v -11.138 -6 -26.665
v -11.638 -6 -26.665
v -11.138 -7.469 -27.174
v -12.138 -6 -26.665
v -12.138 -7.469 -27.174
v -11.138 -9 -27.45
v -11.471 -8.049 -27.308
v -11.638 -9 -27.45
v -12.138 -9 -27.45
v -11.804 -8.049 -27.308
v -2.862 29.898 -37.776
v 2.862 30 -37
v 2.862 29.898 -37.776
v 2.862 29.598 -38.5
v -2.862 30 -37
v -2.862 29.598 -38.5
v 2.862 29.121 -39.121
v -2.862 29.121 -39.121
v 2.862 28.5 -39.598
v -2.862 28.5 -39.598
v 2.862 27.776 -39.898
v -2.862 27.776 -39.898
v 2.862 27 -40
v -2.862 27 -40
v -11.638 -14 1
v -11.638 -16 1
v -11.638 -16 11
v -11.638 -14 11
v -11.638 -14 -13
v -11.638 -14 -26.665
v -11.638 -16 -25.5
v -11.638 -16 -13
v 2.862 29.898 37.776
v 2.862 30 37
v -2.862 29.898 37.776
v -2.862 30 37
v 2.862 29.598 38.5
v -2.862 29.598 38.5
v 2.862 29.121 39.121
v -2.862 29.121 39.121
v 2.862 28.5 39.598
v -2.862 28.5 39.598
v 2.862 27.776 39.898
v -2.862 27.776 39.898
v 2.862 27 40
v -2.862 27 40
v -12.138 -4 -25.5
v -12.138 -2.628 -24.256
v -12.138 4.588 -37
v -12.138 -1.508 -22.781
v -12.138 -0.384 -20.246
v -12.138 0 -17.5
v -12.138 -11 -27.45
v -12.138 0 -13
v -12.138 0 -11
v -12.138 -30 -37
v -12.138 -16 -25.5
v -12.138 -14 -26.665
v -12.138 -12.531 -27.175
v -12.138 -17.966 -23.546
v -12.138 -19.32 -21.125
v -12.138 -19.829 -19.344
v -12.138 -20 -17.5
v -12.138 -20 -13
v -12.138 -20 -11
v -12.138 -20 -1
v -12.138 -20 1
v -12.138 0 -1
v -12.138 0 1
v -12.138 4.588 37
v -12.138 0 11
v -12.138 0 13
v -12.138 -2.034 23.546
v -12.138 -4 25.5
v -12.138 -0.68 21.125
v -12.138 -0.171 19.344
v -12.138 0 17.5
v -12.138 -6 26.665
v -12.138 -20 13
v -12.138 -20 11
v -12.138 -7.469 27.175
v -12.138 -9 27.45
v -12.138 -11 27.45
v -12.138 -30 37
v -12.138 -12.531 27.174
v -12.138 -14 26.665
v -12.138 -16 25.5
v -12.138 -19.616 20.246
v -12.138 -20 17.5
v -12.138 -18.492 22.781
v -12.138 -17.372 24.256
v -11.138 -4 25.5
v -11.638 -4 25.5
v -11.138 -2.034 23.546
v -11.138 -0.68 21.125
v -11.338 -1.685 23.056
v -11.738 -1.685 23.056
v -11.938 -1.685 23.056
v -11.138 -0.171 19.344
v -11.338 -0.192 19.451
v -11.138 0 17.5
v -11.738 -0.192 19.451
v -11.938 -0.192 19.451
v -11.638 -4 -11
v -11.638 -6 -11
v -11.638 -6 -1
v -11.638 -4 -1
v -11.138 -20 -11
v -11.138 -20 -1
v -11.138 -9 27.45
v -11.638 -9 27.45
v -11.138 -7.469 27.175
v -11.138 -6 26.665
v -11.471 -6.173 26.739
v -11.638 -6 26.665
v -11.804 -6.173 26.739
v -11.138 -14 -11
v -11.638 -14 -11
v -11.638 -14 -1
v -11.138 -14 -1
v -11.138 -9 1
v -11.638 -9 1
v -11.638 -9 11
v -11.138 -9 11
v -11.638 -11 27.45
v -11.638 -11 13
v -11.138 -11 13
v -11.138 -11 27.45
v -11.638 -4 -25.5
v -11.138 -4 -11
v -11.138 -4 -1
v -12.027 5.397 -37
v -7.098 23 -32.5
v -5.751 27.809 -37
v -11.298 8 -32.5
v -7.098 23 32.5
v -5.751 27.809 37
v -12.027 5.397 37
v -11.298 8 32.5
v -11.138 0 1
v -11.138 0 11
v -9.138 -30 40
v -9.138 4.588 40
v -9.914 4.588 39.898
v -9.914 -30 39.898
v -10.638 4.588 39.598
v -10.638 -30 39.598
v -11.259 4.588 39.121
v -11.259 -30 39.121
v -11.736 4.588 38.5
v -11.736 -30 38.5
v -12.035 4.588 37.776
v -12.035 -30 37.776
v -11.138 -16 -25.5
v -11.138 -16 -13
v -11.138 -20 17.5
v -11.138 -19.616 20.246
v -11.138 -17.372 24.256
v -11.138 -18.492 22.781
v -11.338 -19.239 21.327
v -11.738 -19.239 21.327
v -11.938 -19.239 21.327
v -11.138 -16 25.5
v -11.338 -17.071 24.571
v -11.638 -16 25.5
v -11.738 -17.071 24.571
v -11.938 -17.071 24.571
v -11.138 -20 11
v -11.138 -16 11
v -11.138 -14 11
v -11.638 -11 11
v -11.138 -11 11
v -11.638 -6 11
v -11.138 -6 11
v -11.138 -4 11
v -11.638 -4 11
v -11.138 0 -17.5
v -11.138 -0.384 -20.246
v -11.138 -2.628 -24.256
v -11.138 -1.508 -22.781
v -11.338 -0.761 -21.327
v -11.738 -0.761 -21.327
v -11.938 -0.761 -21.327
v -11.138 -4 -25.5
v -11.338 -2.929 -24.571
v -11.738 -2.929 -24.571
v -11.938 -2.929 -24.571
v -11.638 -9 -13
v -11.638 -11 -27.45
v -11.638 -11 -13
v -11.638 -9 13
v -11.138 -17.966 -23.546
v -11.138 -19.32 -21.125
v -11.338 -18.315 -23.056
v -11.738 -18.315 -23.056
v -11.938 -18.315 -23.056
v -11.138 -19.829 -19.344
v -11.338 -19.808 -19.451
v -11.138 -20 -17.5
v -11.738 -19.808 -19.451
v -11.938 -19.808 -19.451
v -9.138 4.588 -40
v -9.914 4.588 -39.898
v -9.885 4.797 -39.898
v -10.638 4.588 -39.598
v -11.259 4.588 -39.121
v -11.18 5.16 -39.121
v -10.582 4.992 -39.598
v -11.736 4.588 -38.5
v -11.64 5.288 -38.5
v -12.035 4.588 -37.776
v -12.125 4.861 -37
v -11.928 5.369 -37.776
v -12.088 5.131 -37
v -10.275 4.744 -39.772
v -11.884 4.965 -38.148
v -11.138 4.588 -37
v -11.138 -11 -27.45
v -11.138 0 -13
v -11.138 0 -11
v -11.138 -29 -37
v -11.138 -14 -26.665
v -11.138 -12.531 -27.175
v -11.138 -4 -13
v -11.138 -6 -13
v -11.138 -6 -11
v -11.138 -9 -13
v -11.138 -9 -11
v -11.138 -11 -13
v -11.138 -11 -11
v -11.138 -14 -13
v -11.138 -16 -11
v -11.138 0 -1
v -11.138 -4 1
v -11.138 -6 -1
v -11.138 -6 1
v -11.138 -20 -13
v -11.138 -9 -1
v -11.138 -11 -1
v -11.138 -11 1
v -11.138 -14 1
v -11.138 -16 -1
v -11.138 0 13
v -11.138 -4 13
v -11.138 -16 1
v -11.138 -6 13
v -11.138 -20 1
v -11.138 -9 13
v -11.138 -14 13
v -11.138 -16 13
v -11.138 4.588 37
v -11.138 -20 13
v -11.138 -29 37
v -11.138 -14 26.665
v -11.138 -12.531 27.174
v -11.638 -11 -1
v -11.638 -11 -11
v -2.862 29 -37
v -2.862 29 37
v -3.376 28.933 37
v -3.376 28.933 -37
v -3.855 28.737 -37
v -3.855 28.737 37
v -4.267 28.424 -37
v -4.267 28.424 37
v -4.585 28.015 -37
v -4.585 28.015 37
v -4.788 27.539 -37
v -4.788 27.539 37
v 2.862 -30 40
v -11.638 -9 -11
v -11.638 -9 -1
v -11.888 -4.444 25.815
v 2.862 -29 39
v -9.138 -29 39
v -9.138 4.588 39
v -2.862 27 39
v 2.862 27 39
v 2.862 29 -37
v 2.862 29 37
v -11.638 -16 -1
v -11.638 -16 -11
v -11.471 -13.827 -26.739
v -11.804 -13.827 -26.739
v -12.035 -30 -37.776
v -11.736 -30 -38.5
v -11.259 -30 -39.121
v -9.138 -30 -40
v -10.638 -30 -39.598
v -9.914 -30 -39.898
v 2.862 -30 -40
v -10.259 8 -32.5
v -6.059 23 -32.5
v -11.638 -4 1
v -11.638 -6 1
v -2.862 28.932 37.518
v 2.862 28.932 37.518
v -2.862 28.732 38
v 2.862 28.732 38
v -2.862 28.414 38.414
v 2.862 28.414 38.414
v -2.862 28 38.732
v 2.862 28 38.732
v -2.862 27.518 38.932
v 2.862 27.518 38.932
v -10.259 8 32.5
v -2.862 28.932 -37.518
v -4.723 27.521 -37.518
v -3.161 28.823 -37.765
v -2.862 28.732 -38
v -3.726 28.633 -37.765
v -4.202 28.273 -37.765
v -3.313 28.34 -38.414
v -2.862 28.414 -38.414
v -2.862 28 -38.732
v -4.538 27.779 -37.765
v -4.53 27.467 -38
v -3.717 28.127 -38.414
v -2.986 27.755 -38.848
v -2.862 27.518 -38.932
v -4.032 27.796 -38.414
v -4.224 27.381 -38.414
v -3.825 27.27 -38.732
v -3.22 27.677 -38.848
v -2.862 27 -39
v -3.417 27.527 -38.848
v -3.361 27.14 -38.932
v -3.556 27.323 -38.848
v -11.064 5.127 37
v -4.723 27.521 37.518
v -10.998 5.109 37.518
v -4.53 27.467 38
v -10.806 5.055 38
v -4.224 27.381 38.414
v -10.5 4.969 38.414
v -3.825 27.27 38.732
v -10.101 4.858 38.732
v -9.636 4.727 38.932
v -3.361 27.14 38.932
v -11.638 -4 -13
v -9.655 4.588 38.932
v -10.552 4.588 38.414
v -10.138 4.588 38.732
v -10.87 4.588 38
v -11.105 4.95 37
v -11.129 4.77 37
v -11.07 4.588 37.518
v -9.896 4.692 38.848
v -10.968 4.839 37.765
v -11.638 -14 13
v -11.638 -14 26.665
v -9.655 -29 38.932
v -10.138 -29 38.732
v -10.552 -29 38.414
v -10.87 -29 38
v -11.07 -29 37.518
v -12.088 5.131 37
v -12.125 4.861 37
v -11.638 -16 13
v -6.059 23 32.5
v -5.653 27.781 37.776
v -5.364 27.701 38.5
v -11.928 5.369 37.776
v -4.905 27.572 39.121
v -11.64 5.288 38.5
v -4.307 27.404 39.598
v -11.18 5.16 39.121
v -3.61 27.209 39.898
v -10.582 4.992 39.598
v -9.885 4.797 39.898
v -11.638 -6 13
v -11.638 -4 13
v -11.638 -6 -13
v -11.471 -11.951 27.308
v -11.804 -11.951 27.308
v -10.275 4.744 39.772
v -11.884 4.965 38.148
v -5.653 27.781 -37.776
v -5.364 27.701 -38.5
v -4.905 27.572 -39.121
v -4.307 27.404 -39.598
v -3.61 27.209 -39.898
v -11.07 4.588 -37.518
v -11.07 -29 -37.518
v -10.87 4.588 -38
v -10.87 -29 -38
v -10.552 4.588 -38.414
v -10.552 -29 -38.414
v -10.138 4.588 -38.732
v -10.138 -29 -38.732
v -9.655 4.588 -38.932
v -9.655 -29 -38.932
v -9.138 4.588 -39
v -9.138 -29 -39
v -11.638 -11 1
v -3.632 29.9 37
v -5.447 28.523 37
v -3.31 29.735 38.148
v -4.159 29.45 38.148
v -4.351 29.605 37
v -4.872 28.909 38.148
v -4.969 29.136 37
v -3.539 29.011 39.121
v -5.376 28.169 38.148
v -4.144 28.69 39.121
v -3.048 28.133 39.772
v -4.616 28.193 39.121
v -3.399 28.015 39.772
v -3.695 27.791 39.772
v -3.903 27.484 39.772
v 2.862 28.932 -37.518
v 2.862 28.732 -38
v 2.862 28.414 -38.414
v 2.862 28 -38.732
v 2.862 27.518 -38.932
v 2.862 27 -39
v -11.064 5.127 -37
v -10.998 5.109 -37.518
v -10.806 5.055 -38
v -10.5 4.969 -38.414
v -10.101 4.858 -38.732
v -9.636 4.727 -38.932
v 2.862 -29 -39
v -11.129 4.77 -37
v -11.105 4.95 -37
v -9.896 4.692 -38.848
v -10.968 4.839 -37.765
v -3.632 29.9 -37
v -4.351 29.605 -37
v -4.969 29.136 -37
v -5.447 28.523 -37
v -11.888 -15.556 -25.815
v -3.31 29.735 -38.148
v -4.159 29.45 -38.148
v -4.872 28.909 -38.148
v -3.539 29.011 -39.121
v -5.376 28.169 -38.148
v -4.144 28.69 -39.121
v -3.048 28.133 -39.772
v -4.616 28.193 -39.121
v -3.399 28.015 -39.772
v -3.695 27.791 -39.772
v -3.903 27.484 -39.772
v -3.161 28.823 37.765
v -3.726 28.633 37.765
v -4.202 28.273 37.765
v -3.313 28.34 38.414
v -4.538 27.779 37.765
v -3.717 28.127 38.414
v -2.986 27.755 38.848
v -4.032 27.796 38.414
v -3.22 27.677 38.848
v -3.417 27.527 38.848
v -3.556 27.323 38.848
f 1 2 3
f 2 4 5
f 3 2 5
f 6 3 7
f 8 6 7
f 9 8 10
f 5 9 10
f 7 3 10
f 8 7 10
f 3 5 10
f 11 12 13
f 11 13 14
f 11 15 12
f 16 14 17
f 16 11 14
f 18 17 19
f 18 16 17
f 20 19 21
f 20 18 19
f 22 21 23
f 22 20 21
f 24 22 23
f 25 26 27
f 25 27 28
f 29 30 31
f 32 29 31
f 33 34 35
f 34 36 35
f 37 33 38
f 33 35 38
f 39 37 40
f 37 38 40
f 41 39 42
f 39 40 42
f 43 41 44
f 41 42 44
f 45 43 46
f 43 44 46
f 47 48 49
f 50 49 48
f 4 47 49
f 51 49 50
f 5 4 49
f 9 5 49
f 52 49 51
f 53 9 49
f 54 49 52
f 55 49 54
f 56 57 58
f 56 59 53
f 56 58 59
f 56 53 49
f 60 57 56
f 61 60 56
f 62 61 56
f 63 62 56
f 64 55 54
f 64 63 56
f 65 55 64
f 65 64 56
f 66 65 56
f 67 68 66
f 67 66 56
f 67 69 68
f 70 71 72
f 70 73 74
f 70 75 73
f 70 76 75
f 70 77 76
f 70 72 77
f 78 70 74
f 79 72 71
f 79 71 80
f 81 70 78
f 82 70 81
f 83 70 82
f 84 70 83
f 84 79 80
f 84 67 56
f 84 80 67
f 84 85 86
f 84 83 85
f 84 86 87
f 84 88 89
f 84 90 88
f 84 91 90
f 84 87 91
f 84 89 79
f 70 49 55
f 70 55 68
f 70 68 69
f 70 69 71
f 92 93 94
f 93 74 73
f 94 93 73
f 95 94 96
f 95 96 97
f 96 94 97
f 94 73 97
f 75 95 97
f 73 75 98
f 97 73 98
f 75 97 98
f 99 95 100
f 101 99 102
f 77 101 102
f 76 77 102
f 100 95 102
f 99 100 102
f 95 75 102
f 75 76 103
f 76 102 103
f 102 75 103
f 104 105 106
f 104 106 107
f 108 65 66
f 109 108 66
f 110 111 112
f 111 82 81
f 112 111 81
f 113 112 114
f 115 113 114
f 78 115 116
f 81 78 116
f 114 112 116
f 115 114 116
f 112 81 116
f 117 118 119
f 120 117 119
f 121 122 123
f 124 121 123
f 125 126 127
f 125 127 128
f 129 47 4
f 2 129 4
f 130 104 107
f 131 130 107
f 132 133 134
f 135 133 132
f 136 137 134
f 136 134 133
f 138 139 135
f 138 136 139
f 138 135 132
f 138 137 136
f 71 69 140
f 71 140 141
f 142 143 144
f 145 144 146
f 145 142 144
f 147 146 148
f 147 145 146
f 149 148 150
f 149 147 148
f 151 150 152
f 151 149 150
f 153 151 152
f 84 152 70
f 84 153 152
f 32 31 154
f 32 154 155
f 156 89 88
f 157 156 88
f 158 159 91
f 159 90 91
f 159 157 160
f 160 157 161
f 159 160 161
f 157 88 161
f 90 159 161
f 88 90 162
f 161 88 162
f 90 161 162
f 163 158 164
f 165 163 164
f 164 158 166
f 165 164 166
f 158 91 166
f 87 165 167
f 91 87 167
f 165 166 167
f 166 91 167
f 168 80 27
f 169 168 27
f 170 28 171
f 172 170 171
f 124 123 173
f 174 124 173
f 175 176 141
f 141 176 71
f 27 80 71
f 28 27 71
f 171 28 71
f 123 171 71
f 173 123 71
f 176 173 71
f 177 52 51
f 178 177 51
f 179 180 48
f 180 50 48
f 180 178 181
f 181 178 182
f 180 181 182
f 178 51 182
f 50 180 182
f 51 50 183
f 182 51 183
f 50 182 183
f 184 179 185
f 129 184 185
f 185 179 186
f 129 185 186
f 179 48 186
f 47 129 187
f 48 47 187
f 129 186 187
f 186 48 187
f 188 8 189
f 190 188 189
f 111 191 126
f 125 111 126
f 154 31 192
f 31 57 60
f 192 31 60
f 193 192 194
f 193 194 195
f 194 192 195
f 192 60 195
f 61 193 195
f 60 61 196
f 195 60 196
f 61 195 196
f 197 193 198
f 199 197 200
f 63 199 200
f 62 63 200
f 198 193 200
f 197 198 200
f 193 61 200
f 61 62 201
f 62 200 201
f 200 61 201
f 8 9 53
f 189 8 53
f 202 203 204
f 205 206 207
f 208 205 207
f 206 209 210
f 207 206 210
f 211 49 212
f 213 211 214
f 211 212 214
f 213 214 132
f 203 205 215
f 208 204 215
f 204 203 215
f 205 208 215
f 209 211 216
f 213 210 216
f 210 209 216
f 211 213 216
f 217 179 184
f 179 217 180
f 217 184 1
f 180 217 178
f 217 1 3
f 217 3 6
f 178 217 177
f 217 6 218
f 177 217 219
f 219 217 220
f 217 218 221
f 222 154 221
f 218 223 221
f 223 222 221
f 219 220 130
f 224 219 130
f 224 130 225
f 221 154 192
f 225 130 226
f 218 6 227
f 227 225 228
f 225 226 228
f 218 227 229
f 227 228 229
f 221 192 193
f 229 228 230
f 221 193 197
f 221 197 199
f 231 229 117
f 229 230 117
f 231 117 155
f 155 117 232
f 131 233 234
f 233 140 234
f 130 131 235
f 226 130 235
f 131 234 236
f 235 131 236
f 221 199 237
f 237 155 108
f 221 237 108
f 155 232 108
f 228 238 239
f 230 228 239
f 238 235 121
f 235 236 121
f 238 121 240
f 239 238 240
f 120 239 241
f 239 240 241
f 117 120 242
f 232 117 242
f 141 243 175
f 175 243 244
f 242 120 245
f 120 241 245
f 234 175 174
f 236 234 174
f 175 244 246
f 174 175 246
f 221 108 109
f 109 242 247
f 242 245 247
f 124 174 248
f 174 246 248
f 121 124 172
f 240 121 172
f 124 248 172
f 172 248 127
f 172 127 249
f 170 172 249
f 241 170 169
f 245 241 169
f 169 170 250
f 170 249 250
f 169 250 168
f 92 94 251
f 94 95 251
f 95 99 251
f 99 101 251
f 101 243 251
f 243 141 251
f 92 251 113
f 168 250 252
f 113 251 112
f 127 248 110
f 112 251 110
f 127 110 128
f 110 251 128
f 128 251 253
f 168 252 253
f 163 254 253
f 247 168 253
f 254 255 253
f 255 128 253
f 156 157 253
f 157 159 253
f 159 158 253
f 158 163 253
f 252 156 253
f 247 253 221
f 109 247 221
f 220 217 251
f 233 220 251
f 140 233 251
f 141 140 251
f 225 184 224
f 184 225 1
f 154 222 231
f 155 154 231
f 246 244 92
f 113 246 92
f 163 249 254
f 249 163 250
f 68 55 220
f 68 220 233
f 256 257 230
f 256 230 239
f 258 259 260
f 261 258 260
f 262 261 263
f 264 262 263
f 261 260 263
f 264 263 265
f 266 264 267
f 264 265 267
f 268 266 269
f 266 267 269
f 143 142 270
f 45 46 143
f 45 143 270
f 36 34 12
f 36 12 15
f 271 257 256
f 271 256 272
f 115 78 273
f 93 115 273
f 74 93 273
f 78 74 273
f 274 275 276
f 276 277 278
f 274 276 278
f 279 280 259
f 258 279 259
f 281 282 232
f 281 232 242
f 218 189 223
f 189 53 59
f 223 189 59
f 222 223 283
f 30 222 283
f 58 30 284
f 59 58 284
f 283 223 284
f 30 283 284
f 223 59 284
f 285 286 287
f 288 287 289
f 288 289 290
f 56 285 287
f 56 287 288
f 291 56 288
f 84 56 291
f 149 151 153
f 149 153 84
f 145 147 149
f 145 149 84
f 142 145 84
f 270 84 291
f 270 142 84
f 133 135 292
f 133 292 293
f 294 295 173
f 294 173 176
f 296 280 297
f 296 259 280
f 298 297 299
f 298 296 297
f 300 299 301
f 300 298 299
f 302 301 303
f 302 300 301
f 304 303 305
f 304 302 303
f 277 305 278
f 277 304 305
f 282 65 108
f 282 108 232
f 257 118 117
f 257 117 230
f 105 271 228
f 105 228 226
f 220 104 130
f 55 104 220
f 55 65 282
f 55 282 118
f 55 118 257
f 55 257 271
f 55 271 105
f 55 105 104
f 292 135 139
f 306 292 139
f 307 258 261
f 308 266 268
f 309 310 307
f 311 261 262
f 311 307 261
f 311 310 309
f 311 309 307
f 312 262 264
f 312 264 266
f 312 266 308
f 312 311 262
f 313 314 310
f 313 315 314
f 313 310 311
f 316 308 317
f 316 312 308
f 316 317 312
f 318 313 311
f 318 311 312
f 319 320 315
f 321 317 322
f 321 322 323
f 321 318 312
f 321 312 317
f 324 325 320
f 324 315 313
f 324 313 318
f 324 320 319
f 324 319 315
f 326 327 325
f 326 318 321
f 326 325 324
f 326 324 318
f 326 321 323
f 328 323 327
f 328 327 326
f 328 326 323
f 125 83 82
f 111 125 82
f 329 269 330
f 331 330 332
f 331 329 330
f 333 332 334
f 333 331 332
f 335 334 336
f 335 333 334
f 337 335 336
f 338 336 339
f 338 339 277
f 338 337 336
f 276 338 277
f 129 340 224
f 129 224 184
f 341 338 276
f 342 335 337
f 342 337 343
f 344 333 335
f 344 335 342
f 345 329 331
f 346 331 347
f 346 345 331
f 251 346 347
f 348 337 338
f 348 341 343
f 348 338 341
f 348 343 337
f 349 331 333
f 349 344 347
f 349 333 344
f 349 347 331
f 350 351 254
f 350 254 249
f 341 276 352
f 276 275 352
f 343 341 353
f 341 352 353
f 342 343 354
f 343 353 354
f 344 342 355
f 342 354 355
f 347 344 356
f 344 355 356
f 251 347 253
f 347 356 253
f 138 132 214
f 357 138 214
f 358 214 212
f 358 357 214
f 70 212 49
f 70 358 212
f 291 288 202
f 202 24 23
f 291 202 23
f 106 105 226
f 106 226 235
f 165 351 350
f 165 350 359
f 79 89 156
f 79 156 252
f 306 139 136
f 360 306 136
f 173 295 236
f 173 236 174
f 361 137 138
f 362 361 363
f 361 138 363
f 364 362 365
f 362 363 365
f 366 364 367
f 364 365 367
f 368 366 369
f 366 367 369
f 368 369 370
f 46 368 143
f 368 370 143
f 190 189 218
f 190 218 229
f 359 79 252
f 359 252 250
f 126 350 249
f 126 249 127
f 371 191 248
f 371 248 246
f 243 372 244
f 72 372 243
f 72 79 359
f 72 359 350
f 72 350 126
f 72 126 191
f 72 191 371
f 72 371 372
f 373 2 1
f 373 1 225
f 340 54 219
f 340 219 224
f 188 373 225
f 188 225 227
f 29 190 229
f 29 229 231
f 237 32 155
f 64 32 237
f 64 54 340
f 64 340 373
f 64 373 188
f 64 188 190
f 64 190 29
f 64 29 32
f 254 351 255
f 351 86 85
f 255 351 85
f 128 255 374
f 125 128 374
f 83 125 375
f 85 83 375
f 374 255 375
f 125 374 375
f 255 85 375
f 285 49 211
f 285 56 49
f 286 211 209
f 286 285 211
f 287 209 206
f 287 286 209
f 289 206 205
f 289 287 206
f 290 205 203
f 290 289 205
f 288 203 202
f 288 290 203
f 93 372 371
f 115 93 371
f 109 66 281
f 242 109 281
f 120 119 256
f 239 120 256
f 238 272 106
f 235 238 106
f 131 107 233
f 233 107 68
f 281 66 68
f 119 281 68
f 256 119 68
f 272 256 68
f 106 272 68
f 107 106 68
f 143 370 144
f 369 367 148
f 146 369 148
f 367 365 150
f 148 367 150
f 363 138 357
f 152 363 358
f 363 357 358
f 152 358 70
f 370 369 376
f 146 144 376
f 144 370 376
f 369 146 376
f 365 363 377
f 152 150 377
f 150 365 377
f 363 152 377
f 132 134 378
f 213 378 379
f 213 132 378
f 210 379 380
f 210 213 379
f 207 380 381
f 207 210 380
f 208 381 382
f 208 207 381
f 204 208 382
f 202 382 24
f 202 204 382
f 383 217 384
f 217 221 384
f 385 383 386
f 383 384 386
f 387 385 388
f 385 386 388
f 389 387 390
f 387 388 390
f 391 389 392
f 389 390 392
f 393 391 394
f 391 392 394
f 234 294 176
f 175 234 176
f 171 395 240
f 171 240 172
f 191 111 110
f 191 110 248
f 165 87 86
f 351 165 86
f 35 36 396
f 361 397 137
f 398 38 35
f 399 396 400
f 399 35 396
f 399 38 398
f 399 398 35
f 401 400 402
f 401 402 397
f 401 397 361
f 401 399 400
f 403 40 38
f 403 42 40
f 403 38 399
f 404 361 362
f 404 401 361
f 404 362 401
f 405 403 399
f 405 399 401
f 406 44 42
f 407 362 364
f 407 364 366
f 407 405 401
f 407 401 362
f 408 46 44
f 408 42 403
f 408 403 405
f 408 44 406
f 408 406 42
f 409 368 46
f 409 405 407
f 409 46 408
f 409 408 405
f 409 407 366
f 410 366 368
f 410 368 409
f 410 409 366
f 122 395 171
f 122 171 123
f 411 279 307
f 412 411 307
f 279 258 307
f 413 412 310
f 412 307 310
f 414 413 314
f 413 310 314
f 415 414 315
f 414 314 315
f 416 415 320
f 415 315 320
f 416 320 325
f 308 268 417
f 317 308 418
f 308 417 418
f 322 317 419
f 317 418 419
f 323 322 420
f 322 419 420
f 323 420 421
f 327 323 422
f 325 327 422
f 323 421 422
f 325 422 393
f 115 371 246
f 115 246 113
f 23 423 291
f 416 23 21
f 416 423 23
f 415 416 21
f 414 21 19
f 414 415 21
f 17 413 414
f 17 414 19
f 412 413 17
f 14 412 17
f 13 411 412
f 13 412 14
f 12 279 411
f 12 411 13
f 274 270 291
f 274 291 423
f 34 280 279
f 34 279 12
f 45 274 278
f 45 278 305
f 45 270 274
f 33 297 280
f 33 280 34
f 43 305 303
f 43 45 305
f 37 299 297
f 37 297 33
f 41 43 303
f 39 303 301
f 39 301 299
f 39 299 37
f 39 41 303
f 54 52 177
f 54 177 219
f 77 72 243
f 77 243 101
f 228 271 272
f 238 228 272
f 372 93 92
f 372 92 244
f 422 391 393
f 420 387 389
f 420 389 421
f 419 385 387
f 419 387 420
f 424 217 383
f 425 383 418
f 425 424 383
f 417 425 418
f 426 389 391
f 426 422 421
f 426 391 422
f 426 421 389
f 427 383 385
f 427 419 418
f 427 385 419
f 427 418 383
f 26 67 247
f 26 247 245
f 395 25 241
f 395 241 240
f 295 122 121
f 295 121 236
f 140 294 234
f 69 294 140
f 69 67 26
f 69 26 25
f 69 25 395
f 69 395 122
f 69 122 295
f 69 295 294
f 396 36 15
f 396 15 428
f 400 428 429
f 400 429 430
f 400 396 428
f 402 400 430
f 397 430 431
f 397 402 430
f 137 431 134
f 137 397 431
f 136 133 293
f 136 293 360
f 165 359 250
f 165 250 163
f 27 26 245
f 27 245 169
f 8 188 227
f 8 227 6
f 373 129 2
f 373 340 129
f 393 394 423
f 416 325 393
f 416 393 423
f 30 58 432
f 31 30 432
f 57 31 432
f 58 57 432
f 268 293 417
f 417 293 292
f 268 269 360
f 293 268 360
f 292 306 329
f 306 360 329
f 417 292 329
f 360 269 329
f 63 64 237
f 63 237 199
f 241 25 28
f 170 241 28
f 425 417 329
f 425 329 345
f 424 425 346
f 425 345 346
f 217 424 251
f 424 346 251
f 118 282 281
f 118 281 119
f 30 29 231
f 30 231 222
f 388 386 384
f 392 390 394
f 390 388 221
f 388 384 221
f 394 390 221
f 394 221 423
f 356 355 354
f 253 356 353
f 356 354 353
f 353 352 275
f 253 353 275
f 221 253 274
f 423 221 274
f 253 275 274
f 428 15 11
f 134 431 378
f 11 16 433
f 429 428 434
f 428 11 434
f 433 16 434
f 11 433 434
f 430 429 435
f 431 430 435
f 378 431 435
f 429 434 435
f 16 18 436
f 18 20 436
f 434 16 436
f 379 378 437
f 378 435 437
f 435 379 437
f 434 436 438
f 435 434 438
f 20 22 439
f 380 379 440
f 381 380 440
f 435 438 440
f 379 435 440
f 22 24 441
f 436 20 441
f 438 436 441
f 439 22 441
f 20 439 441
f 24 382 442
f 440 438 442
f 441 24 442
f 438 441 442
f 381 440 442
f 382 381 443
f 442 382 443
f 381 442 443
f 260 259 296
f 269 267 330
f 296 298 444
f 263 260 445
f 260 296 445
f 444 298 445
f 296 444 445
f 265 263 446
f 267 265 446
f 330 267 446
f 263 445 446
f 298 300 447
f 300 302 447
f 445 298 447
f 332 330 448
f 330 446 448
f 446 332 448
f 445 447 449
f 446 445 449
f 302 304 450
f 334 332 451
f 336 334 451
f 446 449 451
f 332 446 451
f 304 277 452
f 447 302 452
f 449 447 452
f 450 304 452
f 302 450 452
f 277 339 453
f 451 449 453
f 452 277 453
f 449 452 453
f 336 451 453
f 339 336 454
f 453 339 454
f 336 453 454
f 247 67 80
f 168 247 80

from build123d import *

# Parameters (mm, degrees)
BOSS_EXTRUDE1_DEPTH = 40
FILLET1_R           = 3
SHELL1_T            = -1
SKETCH2_W           = 65
SKETCH2_H           = 15
CUT_EXTRUDE1_DEPTH  = 53.201532545
VENT1_START         = -12.137690598
VENT1_OUTLINE_W     = 4
VENT1_OUTLINE_H     = 10
VENT1_OUTLINE_W_2   = 3
VENT1_DEPTH         = 1
VENT1_2_OUTLINE_W   = 2
VENT1_2_OUTLINE_H   = 10
VENT1_2_DEPTH       = 0.5


# Read off the part's stored shape, not the designer's step: Vent1
with BuildPart() as part:
    # Sketch1 → Boss-Extrude1 (new, symmetric)
    with BuildSketch(Plane.XY):
        with BuildLine():
            Line((-5.751201461, 27.808889777), (-12.137690598, 5))
            Line((-12.137690598, 5), (-12.137690598, -30))
            Line((-12.137690598, -30), (2.862309402, -30))
            Line((2.862309402, -30), (2.862309402, 30))
            Line((2.862309402, 30), (-2.862309402, 30))
            ThreePointArc((-2.862309402, 30), (-4.675225653, 29.390258284), (-5.751201461, 27.808889777))
        make_face()
    extrude(amount=BOSS_EXTRUDE1_DEPTH, both=True)

    # Fillet1
    fillet1_edges = [part.edges().sort_by_distance(p)[0] for p in [
        (-12.137690598, 5, 0),
        (-4.675225653, 29.390258284, 40),
        (-8.94444603, 16.404444888, 40),
        (-12.137690598, -12.5, 40),
        (-12.137690598, -12.5, -40),
        (-8.94444603, 16.404444888, -40),
        (-4.675225653, 29.390258284, -40),
        (0, 30, -40),
        (0, 30, 40),
    ]]
    fillet(fillet1_edges, radius=FILLET1_R)

    # Shell1
    shell1_openings = [part.faces().sort_by_distance(p)[0] for p in [
        (2.862309402, -0.023622446, 0),
    ]]
    offset(amount=SHELL1_T, openings=shell1_openings, kind=Kind.INTERSECTION)

    # Sketch2 → Cut-Extrude1 (cut, through all)
    with BuildSketch(Plane.ZY.offset(12.137690598)):
        with Locations((0, 15.5)):
            Rectangle(SKETCH2_W, SKETCH2_H)
    extrude(amount=-CUT_EXTRUDE1_DEPTH, mode=Mode.SUBTRACT)

    # Vent1 outline → Vent1 (cut)
    with BuildSketch(Plane.YZ.offset(VENT1_START)):
        with BuildLine():
            add(Edge.make_bspline(
                [(-20, 17.5), (-20, 18.484636289), (-19.807852804, 19.45090322), (-19.615866008, 20.416363534), (-19.238795325, 21.326834324), (-18.862145538, 22.236288823), (-18.314696123, 23.05570233), (-17.767857785, 23.874201188), (-17.071067812, 24.571067812), (-16.567779985, 25.074411003), (-16, 25.500081295)],
                knots=[0, 0, 0, 0.0625, 0.0625, 0.125, 0.125, 0.1875, 0.1875, 0.25, 0.25, 0.295193876, 0.295193876, 0.295193876], degree=2))
            Line((-20, 17.5), (-20, 13))
            Line((-20, 13), (-16, 13))
            Line((-16, 13), (-16, 25.500081295))
        make_face()
        with BuildLine():
            add(Edge.make_bspline(
                [(-14, 26.665158313), (-13.9138372, 26.702751948), (-13.826834324, 26.738795325), (-12.917421262, 27.11554515), (-11.95090322, 27.307852804), (-11.477855415, 27.40197491), (-11, 27.449991893)],
                knots=[0.369027345, 0.369027345, 0.369027345, 0.375, 0.375, 0.4375, 0.4375, 0.468123874, 0.468123874, 0.468123874], degree=2))
            Line((-14, 26.665158313), (-14, 13))
            Line((-14, 13), (-11, 13))
            Line((-11, 13), (-11, 27.449991893))
        make_face()
        with BuildLine():
            add(Edge.make_bspline(
                [(-9, 27.449990782), (-8.522411136, 27.401973821), (-8.04909678, 27.307852804), (-7.083636466, 27.115866008), (-6.173165676, 26.738795325), (-6.086170897, 26.702766513), (-6, 26.665174873)],
                knots=[0.531893743, 0.531893743, 0.531893743, 0.5625, 0.5625, 0.625, 0.625, 0.6309785, 0.6309785, 0.6309785], degree=2))
            Line((-9, 27.449990782), (-9, 13))
            Line((-9, 13), (-6, 13))
            Line((-6, 13), (-6, 26.665174873))
        make_face()
        with BuildLine():
            add(Edge.make_bspline(
                [(-4, 25.500105578), (-3.432685944, 25.074766157), (-2.928932188, 24.571067812), (-2.232843424, 23.875055613), (-1.685303877, 23.05570233), (-1.138375507, 22.23726363), (-0.761204675, 21.326834324), (-0.38445485, 20.417421262), (-0.192147196, 19.45090322), (0, 18.485191624), (0, 17.5)],
                knots=[0.704819748, 0.704819748, 0.704819748, 0.75, 0.75, 0.8125, 0.8125, 0.875, 0.875, 0.9375, 0.9375, 1, 1, 1], degree=2))
            Line((-4, 25.500105578), (-4, 13))
            Line((-4, 13), (0, 13))
            Line((0, 13), (0, 17.5))
        make_face()
        with BuildLine():
            add(Edge.make_bspline(
                [(0, -17.5), (0, -18.484636289), (-0.192147196, -19.45090322), (-0.384133992, -20.416363534), (-0.761204675, -21.326834324), (-1.137854462, -22.236288823), (-1.685303877, -23.05570233), (-2.232142215, -23.874201188), (-2.928932188, -24.571067812), (-3.432220015, -25.074411003), (-4, -25.500081295)],
                knots=[0, 0, 0, 0.0625, 0.0625, 0.125, 0.125, 0.1875, 0.1875, 0.25, 0.25, 0.295193876, 0.295193876, 0.295193876], degree=2))
            Line((0, -17.5), (0, -13))
            Line((0, -13), (-4, -13))
            Line((-4, -13), (-4, -25.500081295))
        make_face()
        with BuildLine():
            add(Edge.make_bspline(
                [(-6, -26.665158313), (-6.086162801, -26.702751948), (-6.173165676, -26.738795325), (-7.082578738, -27.11554515), (-8.04909678, -27.307852804), (-8.522144585, -27.40197491), (-9, -27.449991893)],
                knots=[0.369027345, 0.369027345, 0.369027345, 0.375, 0.375, 0.4375, 0.4375, 0.468123874, 0.468123874, 0.468123874], degree=2))
            Line((-6, -26.665158313), (-6, -13))
            Line((-6, -13), (-9, -13))
            Line((-9, -13), (-9, -27.449991893))
        make_face()
        with BuildLine():
            add(Edge.make_bspline(
                [(-11, -27.449990782), (-11.477588864, -27.401973821), (-11.95090322, -27.307852804), (-12.916363534, -27.115866008), (-13.826834324, -26.738795325), (-13.913829103, -26.702766513), (-14, -26.665174873)],
                knots=[0.531893743, 0.531893743, 0.531893743, 0.5625, 0.5625, 0.625, 0.625, 0.6309785, 0.6309785, 0.6309785], degree=2))
            Line((-11, -27.449990782), (-11, -13))
            Line((-11, -13), (-14, -13))
            Line((-14, -13), (-14, -26.665174873))
        make_face()
        with BuildLine():
            add(Edge.make_bspline(
                [(-16, -25.500105578), (-16.567314056, -25.074766157), (-17.071067812, -24.571067812), (-17.767156576, -23.875055613), (-18.314696123, -23.05570233), (-18.861624493, -22.23726363), (-19.238795325, -21.326834324), (-19.61554515, -20.417421262), (-19.807852804, -19.45090322), (-20, -18.485191624), (-20, -17.5)],
                knots=[0.704819748, 0.704819748, 0.704819748, 0.75, 0.75, 0.8125, 0.8125, 0.875, 0.875, 0.9375, 0.9375, 1, 1, 1], degree=2))
            Line((-16, -25.500105578), (-16, -13))
            Line((-16, -13), (-20, -13))
            Line((-20, -13), (-20, -17.5))
        make_face()
        with Locations((-2, -6)):
            Rectangle(VENT1_OUTLINE_W, VENT1_OUTLINE_H)
        with Locations((-7.5, -6)):
            Rectangle(VENT1_OUTLINE_W_2, VENT1_OUTLINE_H)
        with Locations((-12.5, -6)):
            Rectangle(VENT1_OUTLINE_W_2, VENT1_OUTLINE_H)
        with Locations((-18, -6)):
            Rectangle(VENT1_OUTLINE_W, VENT1_OUTLINE_H)
        with Locations((-2, 6)):
            Rectangle(VENT1_OUTLINE_W, VENT1_OUTLINE_H)
        with Locations((-7.5, 6)):
            Rectangle(VENT1_OUTLINE_W_2, VENT1_OUTLINE_H)
        with Locations((-12.5, 6)):
            Rectangle(VENT1_OUTLINE_W_2, VENT1_OUTLINE_H)
        with Locations((-18, 6)):
            Rectangle(VENT1_OUTLINE_W, VENT1_OUTLINE_H)
    extrude(amount=VENT1_DEPTH, mode=Mode.SUBTRACT)

    # Vent1 2 outline → Vent1 2 (cut)
    with BuildSketch(Plane.YZ.offset(VENT1_START)):
        with BuildLine():
            add(Edge.make_bspline(
                [(-16, 25.500081295), (-15.782579599, 25.663083528), (-15.55570233, 25.814696123), (-14.815475656, 26.309358665), (-14, 26.665158313)],
                knots=[0.295193876, 0.295193876, 0.295193876, 0.3125, 0.3125, 0.369027345, 0.369027345, 0.369027345], degree=2))
            Line((-16, 25.500081295), (-16, 13))
            Line((-16, 13), (-14, 13))
            Line((-14, 13), (-14, 26.665158313))
        make_face()
        with BuildLine():
            add(Edge.make_bspline(
                [(-11, 27.449991893), (-10.502604415, 27.499972357), (-10, 27.5), (-9.497679153, 27.500027628), (-9, 27.449990782)],
                knots=[0.468123874, 0.468123874, 0.468123874, 0.5, 0.5, 0.531893743, 0.531893743, 0.531893743], degree=2))
            Line((-11, 27.449991893), (-11, 13))
            Line((-11, 13), (-9, 13))
            Line((-9, 13), (-9, 27.449990782))
        make_face()
        with BuildLine():
            add(Edge.make_bspline(
                [(-6, 26.665174873), (-5.18532936, 26.309778717), (-4.44429767, 25.814696123), (-4.217478567, 25.663158488), (-4, 25.500105578)],
                knots=[0.6309785, 0.6309785, 0.6309785, 0.6875, 0.6875, 0.704819748, 0.704819748, 0.704819748], degree=2))
            Line((-6, 26.665174873), (-6, 13))
            Line((-6, 13), (-4, 13))
            Line((-4, 13), (-4, 25.500105578))
        make_face()
        with BuildLine():
            add(Edge.make_bspline(
                [(-4, -25.500081295), (-4.217420401, -25.663083528), (-4.44429767, -25.814696123), (-5.184524344, -26.309358665), (-6, -26.665158313)],
                knots=[0.295193876, 0.295193876, 0.295193876, 0.3125, 0.3125, 0.369027345, 0.369027345, 0.369027345], degree=2))
            Line((-4, -25.500081295), (-4, -13))
            Line((-4, -13), (-6, -13))
            Line((-6, -13), (-6, -26.665158313))
        make_face()
        with BuildLine():
            add(Edge.make_bspline(
                [(-9, -27.449991893), (-9.497395585, -27.499972357), (-10, -27.5), (-10.502320847, -27.500027628), (-11, -27.449990782)],
                knots=[0.468123874, 0.468123874, 0.468123874, 0.5, 0.5, 0.531893743, 0.531893743, 0.531893743], degree=2))
            Line((-9, -27.449991893), (-9, -13))
            Line((-9, -13), (-11, -13))
            Line((-11, -13), (-11, -27.449990782))
        make_face()
        with BuildLine():
            add(Edge.make_bspline(
                [(-14, -26.665174873), (-14.81467064, -26.309778717), (-15.55570233, -25.814696123), (-15.782521433, -25.663158488), (-16, -25.500105578)],
                knots=[0.6309785, 0.6309785, 0.6309785, 0.6875, 0.6875, 0.704819748, 0.704819748, 0.704819748], degree=2))
            Line((-14, -26.665174873), (-14, -13))
            Line((-14, -13), (-16, -13))
            Line((-16, -13), (-16, -25.500105578))
        make_face()
        with Locations((-5, -6)):
            Rectangle(VENT1_2_OUTLINE_W, VENT1_2_OUTLINE_H)
        with Locations((-10, -6)):
            Rectangle(VENT1_2_OUTLINE_W, VENT1_2_OUTLINE_H)
        with Locations((-15, -6)):
            Rectangle(VENT1_2_OUTLINE_W, VENT1_2_OUTLINE_H)
        with Locations((-5, 6)):
            Rectangle(VENT1_2_OUTLINE_W, VENT1_2_OUTLINE_H)
        with Locations((-10, 6)):
            Rectangle(VENT1_2_OUTLINE_W, VENT1_2_OUTLINE_H)
        with Locations((-15, 6)):
            Rectangle(VENT1_2_OUTLINE_W, VENT1_2_OUTLINE_H)
    extrude(amount=VENT1_2_DEPTH, mode=Mode.SUBTRACT)


solid = part.part
